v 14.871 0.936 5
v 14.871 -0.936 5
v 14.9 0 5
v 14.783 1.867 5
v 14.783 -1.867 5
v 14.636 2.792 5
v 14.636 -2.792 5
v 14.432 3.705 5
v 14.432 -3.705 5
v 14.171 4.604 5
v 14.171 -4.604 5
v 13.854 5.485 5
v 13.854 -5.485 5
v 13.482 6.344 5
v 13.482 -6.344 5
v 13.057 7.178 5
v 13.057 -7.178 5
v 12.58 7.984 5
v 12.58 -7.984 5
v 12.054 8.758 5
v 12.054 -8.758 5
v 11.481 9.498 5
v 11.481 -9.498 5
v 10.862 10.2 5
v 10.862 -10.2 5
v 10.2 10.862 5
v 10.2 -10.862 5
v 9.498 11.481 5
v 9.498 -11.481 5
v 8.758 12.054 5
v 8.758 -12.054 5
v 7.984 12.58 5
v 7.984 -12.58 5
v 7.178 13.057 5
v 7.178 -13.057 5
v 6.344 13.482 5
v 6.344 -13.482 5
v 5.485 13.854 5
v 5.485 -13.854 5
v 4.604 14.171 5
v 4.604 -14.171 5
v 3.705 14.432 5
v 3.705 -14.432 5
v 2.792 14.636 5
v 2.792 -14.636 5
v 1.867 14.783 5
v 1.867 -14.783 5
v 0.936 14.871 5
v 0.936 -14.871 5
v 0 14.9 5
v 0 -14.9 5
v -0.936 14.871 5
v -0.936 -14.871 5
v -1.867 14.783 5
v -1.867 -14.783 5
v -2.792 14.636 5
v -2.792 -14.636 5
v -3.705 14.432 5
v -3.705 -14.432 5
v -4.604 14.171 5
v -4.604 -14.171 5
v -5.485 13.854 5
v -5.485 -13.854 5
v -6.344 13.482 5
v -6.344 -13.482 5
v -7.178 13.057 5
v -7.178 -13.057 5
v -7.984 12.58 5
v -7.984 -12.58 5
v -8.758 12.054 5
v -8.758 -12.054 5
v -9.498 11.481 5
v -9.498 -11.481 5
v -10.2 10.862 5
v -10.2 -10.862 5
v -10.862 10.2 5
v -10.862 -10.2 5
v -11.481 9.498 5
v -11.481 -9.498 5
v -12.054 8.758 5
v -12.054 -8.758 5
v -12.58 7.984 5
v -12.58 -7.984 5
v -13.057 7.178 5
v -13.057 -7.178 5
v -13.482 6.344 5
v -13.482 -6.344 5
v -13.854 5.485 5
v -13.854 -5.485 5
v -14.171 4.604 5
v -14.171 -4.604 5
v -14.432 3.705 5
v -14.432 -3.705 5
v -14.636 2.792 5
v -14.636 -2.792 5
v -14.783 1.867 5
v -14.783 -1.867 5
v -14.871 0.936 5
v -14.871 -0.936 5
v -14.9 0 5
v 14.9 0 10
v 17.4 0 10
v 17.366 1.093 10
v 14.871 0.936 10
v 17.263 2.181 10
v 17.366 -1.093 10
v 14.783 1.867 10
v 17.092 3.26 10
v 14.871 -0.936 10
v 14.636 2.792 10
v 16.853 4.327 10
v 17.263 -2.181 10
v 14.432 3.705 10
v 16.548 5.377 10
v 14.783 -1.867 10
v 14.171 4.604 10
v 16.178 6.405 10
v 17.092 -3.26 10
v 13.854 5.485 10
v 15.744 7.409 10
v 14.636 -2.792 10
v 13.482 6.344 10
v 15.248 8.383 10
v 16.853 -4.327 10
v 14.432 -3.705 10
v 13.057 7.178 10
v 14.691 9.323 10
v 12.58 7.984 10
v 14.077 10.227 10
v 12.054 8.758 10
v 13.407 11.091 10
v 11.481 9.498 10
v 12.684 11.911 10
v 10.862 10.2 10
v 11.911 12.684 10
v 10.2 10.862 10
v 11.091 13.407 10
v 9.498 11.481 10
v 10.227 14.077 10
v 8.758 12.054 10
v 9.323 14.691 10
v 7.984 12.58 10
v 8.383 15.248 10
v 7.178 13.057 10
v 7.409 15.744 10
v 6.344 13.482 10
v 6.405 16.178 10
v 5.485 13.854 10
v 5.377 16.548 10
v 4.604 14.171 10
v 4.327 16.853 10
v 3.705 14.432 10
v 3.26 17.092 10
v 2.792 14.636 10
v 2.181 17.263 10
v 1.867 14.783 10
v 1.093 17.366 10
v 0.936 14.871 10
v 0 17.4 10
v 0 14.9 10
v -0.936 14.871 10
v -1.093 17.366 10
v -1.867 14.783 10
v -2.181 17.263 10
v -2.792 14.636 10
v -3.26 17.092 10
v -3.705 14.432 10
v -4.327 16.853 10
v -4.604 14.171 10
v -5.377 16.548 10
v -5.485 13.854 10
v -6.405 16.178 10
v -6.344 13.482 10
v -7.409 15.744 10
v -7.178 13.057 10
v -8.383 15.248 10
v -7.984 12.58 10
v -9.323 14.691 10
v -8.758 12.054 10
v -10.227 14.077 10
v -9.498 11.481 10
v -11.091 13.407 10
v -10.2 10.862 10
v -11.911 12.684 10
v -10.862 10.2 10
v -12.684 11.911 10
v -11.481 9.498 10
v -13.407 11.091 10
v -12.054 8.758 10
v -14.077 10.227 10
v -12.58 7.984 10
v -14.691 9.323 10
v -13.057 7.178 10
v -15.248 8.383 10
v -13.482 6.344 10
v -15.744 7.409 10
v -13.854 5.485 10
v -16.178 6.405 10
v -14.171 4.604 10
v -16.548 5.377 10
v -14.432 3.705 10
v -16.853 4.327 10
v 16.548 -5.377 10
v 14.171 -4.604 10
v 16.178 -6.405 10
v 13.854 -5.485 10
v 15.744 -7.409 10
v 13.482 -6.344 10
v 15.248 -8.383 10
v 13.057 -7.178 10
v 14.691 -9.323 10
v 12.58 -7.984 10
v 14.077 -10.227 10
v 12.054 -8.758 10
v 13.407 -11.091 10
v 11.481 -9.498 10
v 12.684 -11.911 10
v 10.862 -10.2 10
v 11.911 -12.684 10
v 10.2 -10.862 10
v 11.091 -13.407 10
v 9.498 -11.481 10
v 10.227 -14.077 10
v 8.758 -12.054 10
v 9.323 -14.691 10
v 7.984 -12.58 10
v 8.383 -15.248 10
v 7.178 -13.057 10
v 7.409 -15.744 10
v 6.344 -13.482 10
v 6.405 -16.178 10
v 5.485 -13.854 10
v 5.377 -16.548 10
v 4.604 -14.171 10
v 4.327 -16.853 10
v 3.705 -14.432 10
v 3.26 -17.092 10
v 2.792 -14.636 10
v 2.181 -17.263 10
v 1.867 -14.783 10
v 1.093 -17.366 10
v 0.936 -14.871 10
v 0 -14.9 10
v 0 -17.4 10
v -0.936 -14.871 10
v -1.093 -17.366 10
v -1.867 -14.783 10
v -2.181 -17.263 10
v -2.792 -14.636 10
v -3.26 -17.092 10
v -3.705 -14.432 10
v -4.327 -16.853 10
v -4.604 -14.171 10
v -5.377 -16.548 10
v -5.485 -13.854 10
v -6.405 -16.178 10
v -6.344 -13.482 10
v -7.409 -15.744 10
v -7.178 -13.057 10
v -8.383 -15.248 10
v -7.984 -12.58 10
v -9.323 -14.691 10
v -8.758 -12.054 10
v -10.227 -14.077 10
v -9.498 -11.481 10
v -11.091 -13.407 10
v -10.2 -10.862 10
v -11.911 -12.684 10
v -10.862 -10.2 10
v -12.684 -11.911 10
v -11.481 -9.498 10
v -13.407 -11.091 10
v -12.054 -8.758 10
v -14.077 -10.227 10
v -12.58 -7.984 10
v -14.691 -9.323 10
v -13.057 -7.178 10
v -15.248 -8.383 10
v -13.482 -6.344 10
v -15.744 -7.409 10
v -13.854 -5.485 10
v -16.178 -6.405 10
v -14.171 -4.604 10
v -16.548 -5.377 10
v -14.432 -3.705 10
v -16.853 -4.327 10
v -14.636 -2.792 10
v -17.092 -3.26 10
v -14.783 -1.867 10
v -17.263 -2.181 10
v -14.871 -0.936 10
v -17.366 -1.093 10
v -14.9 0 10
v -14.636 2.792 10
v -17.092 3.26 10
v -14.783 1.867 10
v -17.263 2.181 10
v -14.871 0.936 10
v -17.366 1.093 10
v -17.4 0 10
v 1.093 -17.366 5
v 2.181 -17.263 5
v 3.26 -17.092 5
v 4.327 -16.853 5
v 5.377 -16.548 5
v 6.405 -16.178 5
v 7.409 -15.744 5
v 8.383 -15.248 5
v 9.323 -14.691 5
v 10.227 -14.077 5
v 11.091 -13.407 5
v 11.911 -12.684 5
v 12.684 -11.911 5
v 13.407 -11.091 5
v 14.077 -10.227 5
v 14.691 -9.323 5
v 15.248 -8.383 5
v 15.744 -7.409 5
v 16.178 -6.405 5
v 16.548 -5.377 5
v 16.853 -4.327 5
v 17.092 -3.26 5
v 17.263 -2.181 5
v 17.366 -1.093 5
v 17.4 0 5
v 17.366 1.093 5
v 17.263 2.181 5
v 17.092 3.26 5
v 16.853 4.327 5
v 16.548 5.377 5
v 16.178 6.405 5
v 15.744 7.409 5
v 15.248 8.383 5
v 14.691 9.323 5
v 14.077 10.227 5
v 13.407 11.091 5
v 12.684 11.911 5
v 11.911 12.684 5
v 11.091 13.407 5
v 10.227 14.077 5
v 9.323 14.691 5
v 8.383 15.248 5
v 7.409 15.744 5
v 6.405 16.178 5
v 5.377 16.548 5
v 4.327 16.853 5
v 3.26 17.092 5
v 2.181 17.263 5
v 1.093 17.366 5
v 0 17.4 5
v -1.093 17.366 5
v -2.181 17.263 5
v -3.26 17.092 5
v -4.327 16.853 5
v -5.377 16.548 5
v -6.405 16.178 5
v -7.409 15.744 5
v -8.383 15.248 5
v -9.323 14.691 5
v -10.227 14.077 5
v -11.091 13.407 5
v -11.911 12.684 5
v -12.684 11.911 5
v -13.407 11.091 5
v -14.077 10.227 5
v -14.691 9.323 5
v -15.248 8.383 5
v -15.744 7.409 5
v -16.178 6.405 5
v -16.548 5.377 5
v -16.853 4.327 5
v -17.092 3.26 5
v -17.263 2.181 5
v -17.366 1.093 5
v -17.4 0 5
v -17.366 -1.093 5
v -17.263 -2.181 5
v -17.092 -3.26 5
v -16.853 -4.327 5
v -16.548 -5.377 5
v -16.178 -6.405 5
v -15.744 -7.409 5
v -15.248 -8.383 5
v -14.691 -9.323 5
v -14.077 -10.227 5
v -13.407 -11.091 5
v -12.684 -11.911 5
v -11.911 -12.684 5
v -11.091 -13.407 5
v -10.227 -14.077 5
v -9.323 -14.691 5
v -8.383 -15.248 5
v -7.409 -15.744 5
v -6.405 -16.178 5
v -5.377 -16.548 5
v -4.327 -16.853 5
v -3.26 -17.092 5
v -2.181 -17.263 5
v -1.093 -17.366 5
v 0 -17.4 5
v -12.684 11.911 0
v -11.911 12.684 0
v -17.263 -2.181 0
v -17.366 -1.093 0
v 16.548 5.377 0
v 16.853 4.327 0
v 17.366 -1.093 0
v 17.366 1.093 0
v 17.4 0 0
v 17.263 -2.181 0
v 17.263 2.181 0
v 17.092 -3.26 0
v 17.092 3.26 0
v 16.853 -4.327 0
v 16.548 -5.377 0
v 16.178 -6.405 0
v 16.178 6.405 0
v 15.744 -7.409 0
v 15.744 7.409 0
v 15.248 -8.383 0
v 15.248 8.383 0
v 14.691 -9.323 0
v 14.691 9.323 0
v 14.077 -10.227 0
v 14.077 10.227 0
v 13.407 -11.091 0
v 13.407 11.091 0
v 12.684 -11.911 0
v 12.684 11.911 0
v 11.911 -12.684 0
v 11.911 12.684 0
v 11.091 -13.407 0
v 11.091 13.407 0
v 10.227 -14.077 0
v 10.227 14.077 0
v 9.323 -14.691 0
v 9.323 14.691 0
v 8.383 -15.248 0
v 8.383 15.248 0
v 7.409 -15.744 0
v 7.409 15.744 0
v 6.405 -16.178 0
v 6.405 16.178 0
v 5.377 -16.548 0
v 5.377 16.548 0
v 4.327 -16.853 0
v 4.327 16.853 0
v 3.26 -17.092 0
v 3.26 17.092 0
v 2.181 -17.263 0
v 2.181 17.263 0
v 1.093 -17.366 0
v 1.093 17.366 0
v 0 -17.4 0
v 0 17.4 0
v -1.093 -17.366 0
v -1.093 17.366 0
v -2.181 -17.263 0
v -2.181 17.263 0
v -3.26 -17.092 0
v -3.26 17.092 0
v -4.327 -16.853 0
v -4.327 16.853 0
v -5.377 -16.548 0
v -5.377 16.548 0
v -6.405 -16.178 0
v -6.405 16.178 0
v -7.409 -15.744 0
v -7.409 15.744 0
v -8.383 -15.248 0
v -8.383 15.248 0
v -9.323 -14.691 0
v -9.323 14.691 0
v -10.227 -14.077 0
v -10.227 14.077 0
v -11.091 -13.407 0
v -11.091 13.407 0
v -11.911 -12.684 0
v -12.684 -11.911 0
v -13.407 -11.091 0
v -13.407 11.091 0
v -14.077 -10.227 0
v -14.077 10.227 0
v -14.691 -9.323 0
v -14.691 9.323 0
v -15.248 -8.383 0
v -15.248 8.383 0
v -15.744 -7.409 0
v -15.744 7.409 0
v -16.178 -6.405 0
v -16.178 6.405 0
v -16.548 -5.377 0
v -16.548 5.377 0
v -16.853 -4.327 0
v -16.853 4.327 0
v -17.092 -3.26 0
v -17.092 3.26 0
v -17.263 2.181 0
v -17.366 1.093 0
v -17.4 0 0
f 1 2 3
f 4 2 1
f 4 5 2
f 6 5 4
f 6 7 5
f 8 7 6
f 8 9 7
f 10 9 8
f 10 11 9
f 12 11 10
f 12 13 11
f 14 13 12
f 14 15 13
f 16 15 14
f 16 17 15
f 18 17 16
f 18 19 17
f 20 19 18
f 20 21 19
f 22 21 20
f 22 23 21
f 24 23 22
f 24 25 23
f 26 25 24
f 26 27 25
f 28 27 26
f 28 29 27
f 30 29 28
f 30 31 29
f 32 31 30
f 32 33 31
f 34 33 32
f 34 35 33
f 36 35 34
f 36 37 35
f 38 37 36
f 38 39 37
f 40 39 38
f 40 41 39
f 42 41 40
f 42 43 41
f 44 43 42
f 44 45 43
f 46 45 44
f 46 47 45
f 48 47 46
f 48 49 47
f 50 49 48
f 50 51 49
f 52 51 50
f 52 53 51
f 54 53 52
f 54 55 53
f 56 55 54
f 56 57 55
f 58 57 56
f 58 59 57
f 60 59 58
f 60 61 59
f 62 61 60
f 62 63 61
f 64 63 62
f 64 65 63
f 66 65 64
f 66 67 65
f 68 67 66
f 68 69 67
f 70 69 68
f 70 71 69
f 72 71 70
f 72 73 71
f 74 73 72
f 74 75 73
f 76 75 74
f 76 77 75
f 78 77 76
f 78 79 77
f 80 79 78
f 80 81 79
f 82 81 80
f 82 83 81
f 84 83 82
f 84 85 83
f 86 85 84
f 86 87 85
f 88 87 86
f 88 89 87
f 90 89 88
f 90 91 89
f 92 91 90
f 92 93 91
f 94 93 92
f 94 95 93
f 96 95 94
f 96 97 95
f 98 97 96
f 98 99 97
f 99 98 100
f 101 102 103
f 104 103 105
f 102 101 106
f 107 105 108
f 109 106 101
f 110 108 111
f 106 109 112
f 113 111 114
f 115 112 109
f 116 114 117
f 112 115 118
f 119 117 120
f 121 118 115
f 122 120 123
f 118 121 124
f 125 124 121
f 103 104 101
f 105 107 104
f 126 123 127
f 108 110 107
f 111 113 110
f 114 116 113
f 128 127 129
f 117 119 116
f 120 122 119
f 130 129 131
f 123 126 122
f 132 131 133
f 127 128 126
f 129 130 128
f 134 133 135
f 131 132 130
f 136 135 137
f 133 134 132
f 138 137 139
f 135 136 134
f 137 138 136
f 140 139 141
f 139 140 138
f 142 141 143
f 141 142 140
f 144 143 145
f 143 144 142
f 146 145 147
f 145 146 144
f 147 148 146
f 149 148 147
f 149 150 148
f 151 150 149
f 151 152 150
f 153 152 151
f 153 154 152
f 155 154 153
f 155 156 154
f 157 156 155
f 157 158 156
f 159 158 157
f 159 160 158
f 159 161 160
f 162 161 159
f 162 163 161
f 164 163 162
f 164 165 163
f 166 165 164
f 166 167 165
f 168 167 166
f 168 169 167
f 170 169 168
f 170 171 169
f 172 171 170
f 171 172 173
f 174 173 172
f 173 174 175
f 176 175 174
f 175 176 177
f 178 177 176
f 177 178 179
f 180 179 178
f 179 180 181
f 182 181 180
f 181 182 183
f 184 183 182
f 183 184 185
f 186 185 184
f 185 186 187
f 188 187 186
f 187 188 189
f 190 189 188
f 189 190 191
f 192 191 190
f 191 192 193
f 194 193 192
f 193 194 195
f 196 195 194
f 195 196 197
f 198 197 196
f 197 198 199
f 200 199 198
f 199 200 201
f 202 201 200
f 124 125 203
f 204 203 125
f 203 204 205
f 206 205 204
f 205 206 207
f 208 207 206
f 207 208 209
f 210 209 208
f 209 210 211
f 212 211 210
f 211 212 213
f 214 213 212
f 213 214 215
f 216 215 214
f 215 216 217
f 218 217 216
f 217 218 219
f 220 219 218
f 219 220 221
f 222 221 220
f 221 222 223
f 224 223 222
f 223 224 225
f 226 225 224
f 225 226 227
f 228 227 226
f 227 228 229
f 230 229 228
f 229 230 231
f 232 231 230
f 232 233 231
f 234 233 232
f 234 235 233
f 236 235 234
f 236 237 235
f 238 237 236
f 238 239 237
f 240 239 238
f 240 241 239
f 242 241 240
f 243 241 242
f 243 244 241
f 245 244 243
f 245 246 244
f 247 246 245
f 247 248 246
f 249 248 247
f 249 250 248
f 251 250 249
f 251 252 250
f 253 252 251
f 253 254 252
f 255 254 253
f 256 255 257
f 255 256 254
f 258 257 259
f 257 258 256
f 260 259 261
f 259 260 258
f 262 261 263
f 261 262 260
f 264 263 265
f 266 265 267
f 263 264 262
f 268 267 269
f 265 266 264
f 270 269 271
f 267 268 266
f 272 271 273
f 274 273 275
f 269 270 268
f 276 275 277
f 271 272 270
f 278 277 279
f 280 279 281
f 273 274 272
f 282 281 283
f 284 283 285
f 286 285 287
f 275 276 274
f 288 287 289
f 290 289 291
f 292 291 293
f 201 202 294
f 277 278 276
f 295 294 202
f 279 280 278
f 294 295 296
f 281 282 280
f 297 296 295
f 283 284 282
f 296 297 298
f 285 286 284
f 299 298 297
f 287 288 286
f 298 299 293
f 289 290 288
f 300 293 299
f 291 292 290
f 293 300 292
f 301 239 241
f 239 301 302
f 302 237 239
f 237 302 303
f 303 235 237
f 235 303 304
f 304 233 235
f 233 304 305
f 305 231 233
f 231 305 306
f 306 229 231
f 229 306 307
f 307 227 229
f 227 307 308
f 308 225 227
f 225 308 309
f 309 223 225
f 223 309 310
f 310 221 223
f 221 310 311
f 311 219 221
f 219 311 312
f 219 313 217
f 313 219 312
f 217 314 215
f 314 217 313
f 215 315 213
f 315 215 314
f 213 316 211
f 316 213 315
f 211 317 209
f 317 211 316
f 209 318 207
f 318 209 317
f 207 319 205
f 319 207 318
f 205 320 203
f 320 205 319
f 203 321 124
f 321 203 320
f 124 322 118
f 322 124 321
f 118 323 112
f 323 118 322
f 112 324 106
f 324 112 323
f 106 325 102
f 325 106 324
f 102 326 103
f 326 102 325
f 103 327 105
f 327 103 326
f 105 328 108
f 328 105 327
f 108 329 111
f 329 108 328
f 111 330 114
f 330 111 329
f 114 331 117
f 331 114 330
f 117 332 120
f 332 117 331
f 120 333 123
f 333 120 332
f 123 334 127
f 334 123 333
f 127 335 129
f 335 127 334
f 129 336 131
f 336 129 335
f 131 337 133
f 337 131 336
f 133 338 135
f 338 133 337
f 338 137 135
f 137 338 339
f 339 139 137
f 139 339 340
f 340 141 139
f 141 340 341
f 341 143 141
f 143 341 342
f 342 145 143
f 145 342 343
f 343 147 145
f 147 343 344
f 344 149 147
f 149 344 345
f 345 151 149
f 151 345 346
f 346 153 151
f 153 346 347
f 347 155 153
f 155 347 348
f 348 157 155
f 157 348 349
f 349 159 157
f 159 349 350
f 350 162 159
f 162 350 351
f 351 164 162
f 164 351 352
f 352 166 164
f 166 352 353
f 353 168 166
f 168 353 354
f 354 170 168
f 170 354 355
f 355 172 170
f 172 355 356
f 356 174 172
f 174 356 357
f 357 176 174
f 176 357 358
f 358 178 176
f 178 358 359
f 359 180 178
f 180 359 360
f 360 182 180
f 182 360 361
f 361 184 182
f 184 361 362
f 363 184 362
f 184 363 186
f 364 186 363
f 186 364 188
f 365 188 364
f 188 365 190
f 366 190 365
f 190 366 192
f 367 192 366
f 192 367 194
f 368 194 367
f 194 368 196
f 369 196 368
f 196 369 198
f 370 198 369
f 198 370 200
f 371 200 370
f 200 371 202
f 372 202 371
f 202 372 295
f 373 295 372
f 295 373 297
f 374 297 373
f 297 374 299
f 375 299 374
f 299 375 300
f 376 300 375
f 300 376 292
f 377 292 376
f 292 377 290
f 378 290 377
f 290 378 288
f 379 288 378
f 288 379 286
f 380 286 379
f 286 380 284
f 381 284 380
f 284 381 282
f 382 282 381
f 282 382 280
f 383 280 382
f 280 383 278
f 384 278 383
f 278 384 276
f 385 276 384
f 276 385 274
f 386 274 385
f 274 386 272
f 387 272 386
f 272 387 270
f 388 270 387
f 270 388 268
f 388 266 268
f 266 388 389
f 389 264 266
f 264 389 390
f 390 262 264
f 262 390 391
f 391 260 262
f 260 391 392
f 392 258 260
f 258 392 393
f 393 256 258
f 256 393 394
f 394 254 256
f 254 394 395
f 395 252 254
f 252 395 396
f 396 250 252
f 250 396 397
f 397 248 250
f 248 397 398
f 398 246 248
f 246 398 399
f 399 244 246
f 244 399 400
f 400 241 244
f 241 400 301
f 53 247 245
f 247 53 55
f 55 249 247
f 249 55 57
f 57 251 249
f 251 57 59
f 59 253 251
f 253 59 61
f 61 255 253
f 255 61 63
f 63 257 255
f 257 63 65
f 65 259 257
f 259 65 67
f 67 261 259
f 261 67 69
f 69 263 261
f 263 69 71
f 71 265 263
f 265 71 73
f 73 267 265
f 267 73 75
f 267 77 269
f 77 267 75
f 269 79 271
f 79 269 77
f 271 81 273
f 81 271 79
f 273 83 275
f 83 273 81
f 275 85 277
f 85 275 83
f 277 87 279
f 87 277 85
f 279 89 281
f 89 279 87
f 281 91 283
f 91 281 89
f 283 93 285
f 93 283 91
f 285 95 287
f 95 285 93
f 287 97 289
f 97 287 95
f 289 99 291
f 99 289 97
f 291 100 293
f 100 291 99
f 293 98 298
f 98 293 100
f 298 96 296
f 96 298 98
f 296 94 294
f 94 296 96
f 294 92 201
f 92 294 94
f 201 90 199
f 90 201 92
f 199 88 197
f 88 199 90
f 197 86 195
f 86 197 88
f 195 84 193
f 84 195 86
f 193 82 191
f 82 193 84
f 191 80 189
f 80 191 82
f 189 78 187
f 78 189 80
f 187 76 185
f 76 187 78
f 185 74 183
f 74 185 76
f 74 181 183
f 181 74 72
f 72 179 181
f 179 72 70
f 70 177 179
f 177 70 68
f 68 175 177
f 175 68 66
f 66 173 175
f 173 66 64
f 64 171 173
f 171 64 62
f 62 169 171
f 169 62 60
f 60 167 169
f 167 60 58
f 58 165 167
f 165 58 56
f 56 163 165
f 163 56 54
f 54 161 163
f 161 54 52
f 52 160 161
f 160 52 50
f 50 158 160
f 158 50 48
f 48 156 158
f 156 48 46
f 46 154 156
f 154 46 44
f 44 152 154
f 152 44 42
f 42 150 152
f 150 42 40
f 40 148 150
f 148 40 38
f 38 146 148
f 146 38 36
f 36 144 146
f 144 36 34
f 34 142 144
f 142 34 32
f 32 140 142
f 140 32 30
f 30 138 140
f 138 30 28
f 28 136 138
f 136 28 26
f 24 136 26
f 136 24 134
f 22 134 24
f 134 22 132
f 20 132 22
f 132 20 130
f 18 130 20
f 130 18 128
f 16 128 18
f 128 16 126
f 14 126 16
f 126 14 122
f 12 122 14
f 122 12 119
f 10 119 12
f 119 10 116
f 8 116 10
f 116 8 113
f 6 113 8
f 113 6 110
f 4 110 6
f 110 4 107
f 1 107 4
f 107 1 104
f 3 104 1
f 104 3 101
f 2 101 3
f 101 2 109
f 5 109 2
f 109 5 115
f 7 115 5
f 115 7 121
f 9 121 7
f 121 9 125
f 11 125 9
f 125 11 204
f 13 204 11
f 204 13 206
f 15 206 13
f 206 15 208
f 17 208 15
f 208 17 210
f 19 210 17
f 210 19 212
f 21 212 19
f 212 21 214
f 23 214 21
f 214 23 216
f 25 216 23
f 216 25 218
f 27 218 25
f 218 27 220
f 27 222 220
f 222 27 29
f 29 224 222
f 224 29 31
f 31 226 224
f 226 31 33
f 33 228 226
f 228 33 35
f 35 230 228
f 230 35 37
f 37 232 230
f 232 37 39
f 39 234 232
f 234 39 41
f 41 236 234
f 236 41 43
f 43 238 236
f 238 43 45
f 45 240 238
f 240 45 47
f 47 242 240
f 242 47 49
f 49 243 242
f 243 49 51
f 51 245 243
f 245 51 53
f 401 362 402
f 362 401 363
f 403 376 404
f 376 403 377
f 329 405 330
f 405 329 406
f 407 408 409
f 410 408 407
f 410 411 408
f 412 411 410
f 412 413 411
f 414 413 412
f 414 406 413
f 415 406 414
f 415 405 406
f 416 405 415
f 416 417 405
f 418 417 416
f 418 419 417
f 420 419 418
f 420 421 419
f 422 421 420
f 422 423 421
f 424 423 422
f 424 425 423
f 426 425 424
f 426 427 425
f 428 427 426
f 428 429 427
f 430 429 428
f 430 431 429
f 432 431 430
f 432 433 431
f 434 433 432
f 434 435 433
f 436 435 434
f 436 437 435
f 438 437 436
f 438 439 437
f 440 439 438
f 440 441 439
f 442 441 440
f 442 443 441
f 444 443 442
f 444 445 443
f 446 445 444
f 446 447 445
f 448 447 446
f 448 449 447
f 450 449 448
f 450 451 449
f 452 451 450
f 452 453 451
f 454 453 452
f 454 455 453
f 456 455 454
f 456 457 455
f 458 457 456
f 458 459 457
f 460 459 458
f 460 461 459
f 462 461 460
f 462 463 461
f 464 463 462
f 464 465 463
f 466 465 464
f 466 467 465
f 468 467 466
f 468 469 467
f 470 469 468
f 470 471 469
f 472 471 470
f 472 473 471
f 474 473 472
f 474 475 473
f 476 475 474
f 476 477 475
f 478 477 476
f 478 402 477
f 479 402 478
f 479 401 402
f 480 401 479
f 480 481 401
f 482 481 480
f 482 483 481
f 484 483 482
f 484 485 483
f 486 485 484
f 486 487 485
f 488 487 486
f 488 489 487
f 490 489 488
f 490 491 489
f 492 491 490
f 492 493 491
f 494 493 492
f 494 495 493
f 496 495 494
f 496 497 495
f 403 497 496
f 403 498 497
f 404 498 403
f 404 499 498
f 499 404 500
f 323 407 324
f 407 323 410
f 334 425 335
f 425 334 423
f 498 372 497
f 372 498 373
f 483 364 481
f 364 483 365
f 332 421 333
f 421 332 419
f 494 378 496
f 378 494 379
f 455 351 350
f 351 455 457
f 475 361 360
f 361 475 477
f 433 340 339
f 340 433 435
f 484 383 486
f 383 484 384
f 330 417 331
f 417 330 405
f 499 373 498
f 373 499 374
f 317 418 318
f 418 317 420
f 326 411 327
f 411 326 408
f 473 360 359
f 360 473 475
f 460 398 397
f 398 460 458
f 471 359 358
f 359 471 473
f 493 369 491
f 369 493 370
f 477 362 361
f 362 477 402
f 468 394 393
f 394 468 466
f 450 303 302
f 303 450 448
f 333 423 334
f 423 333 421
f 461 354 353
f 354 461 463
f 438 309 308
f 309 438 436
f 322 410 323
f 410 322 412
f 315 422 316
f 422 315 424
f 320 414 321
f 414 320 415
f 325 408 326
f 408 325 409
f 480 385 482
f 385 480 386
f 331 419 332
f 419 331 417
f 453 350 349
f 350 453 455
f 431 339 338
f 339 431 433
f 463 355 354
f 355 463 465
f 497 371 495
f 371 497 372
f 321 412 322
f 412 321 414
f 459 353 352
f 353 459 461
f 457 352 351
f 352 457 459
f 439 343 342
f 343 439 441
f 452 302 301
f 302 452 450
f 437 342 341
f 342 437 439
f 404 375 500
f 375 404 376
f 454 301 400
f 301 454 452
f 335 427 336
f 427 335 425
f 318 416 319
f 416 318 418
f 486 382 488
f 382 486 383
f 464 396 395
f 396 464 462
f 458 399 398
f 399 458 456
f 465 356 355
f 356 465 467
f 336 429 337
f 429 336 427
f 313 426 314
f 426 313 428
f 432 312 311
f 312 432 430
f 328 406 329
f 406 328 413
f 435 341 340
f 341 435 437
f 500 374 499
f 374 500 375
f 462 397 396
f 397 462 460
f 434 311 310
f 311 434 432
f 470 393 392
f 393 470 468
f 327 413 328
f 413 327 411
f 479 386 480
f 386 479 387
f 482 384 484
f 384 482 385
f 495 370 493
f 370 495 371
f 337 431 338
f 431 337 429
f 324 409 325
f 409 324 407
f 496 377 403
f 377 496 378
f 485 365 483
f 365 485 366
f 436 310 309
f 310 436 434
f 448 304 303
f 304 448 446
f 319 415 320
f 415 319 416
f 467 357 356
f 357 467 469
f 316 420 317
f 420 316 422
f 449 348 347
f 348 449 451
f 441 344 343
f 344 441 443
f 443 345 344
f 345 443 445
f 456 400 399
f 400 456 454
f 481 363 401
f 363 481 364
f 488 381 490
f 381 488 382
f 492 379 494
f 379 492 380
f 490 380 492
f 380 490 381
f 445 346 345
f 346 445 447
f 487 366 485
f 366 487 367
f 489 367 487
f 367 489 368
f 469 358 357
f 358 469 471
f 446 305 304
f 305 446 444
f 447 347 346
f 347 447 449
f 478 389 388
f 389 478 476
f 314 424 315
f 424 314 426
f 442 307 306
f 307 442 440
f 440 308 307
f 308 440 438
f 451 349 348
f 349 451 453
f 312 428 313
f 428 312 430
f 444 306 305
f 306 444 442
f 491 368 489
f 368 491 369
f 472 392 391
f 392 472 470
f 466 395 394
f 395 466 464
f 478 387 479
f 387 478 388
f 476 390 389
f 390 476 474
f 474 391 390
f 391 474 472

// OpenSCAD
$fn = 100;

border = 5;
hole = 29.8;

translate([0, 0, 5]) linear_extrude(height = 5) difference() {
  circle(d = hole + border);
  circle(d = hole);
}

cylinder(d = hole + border, h = 5);
